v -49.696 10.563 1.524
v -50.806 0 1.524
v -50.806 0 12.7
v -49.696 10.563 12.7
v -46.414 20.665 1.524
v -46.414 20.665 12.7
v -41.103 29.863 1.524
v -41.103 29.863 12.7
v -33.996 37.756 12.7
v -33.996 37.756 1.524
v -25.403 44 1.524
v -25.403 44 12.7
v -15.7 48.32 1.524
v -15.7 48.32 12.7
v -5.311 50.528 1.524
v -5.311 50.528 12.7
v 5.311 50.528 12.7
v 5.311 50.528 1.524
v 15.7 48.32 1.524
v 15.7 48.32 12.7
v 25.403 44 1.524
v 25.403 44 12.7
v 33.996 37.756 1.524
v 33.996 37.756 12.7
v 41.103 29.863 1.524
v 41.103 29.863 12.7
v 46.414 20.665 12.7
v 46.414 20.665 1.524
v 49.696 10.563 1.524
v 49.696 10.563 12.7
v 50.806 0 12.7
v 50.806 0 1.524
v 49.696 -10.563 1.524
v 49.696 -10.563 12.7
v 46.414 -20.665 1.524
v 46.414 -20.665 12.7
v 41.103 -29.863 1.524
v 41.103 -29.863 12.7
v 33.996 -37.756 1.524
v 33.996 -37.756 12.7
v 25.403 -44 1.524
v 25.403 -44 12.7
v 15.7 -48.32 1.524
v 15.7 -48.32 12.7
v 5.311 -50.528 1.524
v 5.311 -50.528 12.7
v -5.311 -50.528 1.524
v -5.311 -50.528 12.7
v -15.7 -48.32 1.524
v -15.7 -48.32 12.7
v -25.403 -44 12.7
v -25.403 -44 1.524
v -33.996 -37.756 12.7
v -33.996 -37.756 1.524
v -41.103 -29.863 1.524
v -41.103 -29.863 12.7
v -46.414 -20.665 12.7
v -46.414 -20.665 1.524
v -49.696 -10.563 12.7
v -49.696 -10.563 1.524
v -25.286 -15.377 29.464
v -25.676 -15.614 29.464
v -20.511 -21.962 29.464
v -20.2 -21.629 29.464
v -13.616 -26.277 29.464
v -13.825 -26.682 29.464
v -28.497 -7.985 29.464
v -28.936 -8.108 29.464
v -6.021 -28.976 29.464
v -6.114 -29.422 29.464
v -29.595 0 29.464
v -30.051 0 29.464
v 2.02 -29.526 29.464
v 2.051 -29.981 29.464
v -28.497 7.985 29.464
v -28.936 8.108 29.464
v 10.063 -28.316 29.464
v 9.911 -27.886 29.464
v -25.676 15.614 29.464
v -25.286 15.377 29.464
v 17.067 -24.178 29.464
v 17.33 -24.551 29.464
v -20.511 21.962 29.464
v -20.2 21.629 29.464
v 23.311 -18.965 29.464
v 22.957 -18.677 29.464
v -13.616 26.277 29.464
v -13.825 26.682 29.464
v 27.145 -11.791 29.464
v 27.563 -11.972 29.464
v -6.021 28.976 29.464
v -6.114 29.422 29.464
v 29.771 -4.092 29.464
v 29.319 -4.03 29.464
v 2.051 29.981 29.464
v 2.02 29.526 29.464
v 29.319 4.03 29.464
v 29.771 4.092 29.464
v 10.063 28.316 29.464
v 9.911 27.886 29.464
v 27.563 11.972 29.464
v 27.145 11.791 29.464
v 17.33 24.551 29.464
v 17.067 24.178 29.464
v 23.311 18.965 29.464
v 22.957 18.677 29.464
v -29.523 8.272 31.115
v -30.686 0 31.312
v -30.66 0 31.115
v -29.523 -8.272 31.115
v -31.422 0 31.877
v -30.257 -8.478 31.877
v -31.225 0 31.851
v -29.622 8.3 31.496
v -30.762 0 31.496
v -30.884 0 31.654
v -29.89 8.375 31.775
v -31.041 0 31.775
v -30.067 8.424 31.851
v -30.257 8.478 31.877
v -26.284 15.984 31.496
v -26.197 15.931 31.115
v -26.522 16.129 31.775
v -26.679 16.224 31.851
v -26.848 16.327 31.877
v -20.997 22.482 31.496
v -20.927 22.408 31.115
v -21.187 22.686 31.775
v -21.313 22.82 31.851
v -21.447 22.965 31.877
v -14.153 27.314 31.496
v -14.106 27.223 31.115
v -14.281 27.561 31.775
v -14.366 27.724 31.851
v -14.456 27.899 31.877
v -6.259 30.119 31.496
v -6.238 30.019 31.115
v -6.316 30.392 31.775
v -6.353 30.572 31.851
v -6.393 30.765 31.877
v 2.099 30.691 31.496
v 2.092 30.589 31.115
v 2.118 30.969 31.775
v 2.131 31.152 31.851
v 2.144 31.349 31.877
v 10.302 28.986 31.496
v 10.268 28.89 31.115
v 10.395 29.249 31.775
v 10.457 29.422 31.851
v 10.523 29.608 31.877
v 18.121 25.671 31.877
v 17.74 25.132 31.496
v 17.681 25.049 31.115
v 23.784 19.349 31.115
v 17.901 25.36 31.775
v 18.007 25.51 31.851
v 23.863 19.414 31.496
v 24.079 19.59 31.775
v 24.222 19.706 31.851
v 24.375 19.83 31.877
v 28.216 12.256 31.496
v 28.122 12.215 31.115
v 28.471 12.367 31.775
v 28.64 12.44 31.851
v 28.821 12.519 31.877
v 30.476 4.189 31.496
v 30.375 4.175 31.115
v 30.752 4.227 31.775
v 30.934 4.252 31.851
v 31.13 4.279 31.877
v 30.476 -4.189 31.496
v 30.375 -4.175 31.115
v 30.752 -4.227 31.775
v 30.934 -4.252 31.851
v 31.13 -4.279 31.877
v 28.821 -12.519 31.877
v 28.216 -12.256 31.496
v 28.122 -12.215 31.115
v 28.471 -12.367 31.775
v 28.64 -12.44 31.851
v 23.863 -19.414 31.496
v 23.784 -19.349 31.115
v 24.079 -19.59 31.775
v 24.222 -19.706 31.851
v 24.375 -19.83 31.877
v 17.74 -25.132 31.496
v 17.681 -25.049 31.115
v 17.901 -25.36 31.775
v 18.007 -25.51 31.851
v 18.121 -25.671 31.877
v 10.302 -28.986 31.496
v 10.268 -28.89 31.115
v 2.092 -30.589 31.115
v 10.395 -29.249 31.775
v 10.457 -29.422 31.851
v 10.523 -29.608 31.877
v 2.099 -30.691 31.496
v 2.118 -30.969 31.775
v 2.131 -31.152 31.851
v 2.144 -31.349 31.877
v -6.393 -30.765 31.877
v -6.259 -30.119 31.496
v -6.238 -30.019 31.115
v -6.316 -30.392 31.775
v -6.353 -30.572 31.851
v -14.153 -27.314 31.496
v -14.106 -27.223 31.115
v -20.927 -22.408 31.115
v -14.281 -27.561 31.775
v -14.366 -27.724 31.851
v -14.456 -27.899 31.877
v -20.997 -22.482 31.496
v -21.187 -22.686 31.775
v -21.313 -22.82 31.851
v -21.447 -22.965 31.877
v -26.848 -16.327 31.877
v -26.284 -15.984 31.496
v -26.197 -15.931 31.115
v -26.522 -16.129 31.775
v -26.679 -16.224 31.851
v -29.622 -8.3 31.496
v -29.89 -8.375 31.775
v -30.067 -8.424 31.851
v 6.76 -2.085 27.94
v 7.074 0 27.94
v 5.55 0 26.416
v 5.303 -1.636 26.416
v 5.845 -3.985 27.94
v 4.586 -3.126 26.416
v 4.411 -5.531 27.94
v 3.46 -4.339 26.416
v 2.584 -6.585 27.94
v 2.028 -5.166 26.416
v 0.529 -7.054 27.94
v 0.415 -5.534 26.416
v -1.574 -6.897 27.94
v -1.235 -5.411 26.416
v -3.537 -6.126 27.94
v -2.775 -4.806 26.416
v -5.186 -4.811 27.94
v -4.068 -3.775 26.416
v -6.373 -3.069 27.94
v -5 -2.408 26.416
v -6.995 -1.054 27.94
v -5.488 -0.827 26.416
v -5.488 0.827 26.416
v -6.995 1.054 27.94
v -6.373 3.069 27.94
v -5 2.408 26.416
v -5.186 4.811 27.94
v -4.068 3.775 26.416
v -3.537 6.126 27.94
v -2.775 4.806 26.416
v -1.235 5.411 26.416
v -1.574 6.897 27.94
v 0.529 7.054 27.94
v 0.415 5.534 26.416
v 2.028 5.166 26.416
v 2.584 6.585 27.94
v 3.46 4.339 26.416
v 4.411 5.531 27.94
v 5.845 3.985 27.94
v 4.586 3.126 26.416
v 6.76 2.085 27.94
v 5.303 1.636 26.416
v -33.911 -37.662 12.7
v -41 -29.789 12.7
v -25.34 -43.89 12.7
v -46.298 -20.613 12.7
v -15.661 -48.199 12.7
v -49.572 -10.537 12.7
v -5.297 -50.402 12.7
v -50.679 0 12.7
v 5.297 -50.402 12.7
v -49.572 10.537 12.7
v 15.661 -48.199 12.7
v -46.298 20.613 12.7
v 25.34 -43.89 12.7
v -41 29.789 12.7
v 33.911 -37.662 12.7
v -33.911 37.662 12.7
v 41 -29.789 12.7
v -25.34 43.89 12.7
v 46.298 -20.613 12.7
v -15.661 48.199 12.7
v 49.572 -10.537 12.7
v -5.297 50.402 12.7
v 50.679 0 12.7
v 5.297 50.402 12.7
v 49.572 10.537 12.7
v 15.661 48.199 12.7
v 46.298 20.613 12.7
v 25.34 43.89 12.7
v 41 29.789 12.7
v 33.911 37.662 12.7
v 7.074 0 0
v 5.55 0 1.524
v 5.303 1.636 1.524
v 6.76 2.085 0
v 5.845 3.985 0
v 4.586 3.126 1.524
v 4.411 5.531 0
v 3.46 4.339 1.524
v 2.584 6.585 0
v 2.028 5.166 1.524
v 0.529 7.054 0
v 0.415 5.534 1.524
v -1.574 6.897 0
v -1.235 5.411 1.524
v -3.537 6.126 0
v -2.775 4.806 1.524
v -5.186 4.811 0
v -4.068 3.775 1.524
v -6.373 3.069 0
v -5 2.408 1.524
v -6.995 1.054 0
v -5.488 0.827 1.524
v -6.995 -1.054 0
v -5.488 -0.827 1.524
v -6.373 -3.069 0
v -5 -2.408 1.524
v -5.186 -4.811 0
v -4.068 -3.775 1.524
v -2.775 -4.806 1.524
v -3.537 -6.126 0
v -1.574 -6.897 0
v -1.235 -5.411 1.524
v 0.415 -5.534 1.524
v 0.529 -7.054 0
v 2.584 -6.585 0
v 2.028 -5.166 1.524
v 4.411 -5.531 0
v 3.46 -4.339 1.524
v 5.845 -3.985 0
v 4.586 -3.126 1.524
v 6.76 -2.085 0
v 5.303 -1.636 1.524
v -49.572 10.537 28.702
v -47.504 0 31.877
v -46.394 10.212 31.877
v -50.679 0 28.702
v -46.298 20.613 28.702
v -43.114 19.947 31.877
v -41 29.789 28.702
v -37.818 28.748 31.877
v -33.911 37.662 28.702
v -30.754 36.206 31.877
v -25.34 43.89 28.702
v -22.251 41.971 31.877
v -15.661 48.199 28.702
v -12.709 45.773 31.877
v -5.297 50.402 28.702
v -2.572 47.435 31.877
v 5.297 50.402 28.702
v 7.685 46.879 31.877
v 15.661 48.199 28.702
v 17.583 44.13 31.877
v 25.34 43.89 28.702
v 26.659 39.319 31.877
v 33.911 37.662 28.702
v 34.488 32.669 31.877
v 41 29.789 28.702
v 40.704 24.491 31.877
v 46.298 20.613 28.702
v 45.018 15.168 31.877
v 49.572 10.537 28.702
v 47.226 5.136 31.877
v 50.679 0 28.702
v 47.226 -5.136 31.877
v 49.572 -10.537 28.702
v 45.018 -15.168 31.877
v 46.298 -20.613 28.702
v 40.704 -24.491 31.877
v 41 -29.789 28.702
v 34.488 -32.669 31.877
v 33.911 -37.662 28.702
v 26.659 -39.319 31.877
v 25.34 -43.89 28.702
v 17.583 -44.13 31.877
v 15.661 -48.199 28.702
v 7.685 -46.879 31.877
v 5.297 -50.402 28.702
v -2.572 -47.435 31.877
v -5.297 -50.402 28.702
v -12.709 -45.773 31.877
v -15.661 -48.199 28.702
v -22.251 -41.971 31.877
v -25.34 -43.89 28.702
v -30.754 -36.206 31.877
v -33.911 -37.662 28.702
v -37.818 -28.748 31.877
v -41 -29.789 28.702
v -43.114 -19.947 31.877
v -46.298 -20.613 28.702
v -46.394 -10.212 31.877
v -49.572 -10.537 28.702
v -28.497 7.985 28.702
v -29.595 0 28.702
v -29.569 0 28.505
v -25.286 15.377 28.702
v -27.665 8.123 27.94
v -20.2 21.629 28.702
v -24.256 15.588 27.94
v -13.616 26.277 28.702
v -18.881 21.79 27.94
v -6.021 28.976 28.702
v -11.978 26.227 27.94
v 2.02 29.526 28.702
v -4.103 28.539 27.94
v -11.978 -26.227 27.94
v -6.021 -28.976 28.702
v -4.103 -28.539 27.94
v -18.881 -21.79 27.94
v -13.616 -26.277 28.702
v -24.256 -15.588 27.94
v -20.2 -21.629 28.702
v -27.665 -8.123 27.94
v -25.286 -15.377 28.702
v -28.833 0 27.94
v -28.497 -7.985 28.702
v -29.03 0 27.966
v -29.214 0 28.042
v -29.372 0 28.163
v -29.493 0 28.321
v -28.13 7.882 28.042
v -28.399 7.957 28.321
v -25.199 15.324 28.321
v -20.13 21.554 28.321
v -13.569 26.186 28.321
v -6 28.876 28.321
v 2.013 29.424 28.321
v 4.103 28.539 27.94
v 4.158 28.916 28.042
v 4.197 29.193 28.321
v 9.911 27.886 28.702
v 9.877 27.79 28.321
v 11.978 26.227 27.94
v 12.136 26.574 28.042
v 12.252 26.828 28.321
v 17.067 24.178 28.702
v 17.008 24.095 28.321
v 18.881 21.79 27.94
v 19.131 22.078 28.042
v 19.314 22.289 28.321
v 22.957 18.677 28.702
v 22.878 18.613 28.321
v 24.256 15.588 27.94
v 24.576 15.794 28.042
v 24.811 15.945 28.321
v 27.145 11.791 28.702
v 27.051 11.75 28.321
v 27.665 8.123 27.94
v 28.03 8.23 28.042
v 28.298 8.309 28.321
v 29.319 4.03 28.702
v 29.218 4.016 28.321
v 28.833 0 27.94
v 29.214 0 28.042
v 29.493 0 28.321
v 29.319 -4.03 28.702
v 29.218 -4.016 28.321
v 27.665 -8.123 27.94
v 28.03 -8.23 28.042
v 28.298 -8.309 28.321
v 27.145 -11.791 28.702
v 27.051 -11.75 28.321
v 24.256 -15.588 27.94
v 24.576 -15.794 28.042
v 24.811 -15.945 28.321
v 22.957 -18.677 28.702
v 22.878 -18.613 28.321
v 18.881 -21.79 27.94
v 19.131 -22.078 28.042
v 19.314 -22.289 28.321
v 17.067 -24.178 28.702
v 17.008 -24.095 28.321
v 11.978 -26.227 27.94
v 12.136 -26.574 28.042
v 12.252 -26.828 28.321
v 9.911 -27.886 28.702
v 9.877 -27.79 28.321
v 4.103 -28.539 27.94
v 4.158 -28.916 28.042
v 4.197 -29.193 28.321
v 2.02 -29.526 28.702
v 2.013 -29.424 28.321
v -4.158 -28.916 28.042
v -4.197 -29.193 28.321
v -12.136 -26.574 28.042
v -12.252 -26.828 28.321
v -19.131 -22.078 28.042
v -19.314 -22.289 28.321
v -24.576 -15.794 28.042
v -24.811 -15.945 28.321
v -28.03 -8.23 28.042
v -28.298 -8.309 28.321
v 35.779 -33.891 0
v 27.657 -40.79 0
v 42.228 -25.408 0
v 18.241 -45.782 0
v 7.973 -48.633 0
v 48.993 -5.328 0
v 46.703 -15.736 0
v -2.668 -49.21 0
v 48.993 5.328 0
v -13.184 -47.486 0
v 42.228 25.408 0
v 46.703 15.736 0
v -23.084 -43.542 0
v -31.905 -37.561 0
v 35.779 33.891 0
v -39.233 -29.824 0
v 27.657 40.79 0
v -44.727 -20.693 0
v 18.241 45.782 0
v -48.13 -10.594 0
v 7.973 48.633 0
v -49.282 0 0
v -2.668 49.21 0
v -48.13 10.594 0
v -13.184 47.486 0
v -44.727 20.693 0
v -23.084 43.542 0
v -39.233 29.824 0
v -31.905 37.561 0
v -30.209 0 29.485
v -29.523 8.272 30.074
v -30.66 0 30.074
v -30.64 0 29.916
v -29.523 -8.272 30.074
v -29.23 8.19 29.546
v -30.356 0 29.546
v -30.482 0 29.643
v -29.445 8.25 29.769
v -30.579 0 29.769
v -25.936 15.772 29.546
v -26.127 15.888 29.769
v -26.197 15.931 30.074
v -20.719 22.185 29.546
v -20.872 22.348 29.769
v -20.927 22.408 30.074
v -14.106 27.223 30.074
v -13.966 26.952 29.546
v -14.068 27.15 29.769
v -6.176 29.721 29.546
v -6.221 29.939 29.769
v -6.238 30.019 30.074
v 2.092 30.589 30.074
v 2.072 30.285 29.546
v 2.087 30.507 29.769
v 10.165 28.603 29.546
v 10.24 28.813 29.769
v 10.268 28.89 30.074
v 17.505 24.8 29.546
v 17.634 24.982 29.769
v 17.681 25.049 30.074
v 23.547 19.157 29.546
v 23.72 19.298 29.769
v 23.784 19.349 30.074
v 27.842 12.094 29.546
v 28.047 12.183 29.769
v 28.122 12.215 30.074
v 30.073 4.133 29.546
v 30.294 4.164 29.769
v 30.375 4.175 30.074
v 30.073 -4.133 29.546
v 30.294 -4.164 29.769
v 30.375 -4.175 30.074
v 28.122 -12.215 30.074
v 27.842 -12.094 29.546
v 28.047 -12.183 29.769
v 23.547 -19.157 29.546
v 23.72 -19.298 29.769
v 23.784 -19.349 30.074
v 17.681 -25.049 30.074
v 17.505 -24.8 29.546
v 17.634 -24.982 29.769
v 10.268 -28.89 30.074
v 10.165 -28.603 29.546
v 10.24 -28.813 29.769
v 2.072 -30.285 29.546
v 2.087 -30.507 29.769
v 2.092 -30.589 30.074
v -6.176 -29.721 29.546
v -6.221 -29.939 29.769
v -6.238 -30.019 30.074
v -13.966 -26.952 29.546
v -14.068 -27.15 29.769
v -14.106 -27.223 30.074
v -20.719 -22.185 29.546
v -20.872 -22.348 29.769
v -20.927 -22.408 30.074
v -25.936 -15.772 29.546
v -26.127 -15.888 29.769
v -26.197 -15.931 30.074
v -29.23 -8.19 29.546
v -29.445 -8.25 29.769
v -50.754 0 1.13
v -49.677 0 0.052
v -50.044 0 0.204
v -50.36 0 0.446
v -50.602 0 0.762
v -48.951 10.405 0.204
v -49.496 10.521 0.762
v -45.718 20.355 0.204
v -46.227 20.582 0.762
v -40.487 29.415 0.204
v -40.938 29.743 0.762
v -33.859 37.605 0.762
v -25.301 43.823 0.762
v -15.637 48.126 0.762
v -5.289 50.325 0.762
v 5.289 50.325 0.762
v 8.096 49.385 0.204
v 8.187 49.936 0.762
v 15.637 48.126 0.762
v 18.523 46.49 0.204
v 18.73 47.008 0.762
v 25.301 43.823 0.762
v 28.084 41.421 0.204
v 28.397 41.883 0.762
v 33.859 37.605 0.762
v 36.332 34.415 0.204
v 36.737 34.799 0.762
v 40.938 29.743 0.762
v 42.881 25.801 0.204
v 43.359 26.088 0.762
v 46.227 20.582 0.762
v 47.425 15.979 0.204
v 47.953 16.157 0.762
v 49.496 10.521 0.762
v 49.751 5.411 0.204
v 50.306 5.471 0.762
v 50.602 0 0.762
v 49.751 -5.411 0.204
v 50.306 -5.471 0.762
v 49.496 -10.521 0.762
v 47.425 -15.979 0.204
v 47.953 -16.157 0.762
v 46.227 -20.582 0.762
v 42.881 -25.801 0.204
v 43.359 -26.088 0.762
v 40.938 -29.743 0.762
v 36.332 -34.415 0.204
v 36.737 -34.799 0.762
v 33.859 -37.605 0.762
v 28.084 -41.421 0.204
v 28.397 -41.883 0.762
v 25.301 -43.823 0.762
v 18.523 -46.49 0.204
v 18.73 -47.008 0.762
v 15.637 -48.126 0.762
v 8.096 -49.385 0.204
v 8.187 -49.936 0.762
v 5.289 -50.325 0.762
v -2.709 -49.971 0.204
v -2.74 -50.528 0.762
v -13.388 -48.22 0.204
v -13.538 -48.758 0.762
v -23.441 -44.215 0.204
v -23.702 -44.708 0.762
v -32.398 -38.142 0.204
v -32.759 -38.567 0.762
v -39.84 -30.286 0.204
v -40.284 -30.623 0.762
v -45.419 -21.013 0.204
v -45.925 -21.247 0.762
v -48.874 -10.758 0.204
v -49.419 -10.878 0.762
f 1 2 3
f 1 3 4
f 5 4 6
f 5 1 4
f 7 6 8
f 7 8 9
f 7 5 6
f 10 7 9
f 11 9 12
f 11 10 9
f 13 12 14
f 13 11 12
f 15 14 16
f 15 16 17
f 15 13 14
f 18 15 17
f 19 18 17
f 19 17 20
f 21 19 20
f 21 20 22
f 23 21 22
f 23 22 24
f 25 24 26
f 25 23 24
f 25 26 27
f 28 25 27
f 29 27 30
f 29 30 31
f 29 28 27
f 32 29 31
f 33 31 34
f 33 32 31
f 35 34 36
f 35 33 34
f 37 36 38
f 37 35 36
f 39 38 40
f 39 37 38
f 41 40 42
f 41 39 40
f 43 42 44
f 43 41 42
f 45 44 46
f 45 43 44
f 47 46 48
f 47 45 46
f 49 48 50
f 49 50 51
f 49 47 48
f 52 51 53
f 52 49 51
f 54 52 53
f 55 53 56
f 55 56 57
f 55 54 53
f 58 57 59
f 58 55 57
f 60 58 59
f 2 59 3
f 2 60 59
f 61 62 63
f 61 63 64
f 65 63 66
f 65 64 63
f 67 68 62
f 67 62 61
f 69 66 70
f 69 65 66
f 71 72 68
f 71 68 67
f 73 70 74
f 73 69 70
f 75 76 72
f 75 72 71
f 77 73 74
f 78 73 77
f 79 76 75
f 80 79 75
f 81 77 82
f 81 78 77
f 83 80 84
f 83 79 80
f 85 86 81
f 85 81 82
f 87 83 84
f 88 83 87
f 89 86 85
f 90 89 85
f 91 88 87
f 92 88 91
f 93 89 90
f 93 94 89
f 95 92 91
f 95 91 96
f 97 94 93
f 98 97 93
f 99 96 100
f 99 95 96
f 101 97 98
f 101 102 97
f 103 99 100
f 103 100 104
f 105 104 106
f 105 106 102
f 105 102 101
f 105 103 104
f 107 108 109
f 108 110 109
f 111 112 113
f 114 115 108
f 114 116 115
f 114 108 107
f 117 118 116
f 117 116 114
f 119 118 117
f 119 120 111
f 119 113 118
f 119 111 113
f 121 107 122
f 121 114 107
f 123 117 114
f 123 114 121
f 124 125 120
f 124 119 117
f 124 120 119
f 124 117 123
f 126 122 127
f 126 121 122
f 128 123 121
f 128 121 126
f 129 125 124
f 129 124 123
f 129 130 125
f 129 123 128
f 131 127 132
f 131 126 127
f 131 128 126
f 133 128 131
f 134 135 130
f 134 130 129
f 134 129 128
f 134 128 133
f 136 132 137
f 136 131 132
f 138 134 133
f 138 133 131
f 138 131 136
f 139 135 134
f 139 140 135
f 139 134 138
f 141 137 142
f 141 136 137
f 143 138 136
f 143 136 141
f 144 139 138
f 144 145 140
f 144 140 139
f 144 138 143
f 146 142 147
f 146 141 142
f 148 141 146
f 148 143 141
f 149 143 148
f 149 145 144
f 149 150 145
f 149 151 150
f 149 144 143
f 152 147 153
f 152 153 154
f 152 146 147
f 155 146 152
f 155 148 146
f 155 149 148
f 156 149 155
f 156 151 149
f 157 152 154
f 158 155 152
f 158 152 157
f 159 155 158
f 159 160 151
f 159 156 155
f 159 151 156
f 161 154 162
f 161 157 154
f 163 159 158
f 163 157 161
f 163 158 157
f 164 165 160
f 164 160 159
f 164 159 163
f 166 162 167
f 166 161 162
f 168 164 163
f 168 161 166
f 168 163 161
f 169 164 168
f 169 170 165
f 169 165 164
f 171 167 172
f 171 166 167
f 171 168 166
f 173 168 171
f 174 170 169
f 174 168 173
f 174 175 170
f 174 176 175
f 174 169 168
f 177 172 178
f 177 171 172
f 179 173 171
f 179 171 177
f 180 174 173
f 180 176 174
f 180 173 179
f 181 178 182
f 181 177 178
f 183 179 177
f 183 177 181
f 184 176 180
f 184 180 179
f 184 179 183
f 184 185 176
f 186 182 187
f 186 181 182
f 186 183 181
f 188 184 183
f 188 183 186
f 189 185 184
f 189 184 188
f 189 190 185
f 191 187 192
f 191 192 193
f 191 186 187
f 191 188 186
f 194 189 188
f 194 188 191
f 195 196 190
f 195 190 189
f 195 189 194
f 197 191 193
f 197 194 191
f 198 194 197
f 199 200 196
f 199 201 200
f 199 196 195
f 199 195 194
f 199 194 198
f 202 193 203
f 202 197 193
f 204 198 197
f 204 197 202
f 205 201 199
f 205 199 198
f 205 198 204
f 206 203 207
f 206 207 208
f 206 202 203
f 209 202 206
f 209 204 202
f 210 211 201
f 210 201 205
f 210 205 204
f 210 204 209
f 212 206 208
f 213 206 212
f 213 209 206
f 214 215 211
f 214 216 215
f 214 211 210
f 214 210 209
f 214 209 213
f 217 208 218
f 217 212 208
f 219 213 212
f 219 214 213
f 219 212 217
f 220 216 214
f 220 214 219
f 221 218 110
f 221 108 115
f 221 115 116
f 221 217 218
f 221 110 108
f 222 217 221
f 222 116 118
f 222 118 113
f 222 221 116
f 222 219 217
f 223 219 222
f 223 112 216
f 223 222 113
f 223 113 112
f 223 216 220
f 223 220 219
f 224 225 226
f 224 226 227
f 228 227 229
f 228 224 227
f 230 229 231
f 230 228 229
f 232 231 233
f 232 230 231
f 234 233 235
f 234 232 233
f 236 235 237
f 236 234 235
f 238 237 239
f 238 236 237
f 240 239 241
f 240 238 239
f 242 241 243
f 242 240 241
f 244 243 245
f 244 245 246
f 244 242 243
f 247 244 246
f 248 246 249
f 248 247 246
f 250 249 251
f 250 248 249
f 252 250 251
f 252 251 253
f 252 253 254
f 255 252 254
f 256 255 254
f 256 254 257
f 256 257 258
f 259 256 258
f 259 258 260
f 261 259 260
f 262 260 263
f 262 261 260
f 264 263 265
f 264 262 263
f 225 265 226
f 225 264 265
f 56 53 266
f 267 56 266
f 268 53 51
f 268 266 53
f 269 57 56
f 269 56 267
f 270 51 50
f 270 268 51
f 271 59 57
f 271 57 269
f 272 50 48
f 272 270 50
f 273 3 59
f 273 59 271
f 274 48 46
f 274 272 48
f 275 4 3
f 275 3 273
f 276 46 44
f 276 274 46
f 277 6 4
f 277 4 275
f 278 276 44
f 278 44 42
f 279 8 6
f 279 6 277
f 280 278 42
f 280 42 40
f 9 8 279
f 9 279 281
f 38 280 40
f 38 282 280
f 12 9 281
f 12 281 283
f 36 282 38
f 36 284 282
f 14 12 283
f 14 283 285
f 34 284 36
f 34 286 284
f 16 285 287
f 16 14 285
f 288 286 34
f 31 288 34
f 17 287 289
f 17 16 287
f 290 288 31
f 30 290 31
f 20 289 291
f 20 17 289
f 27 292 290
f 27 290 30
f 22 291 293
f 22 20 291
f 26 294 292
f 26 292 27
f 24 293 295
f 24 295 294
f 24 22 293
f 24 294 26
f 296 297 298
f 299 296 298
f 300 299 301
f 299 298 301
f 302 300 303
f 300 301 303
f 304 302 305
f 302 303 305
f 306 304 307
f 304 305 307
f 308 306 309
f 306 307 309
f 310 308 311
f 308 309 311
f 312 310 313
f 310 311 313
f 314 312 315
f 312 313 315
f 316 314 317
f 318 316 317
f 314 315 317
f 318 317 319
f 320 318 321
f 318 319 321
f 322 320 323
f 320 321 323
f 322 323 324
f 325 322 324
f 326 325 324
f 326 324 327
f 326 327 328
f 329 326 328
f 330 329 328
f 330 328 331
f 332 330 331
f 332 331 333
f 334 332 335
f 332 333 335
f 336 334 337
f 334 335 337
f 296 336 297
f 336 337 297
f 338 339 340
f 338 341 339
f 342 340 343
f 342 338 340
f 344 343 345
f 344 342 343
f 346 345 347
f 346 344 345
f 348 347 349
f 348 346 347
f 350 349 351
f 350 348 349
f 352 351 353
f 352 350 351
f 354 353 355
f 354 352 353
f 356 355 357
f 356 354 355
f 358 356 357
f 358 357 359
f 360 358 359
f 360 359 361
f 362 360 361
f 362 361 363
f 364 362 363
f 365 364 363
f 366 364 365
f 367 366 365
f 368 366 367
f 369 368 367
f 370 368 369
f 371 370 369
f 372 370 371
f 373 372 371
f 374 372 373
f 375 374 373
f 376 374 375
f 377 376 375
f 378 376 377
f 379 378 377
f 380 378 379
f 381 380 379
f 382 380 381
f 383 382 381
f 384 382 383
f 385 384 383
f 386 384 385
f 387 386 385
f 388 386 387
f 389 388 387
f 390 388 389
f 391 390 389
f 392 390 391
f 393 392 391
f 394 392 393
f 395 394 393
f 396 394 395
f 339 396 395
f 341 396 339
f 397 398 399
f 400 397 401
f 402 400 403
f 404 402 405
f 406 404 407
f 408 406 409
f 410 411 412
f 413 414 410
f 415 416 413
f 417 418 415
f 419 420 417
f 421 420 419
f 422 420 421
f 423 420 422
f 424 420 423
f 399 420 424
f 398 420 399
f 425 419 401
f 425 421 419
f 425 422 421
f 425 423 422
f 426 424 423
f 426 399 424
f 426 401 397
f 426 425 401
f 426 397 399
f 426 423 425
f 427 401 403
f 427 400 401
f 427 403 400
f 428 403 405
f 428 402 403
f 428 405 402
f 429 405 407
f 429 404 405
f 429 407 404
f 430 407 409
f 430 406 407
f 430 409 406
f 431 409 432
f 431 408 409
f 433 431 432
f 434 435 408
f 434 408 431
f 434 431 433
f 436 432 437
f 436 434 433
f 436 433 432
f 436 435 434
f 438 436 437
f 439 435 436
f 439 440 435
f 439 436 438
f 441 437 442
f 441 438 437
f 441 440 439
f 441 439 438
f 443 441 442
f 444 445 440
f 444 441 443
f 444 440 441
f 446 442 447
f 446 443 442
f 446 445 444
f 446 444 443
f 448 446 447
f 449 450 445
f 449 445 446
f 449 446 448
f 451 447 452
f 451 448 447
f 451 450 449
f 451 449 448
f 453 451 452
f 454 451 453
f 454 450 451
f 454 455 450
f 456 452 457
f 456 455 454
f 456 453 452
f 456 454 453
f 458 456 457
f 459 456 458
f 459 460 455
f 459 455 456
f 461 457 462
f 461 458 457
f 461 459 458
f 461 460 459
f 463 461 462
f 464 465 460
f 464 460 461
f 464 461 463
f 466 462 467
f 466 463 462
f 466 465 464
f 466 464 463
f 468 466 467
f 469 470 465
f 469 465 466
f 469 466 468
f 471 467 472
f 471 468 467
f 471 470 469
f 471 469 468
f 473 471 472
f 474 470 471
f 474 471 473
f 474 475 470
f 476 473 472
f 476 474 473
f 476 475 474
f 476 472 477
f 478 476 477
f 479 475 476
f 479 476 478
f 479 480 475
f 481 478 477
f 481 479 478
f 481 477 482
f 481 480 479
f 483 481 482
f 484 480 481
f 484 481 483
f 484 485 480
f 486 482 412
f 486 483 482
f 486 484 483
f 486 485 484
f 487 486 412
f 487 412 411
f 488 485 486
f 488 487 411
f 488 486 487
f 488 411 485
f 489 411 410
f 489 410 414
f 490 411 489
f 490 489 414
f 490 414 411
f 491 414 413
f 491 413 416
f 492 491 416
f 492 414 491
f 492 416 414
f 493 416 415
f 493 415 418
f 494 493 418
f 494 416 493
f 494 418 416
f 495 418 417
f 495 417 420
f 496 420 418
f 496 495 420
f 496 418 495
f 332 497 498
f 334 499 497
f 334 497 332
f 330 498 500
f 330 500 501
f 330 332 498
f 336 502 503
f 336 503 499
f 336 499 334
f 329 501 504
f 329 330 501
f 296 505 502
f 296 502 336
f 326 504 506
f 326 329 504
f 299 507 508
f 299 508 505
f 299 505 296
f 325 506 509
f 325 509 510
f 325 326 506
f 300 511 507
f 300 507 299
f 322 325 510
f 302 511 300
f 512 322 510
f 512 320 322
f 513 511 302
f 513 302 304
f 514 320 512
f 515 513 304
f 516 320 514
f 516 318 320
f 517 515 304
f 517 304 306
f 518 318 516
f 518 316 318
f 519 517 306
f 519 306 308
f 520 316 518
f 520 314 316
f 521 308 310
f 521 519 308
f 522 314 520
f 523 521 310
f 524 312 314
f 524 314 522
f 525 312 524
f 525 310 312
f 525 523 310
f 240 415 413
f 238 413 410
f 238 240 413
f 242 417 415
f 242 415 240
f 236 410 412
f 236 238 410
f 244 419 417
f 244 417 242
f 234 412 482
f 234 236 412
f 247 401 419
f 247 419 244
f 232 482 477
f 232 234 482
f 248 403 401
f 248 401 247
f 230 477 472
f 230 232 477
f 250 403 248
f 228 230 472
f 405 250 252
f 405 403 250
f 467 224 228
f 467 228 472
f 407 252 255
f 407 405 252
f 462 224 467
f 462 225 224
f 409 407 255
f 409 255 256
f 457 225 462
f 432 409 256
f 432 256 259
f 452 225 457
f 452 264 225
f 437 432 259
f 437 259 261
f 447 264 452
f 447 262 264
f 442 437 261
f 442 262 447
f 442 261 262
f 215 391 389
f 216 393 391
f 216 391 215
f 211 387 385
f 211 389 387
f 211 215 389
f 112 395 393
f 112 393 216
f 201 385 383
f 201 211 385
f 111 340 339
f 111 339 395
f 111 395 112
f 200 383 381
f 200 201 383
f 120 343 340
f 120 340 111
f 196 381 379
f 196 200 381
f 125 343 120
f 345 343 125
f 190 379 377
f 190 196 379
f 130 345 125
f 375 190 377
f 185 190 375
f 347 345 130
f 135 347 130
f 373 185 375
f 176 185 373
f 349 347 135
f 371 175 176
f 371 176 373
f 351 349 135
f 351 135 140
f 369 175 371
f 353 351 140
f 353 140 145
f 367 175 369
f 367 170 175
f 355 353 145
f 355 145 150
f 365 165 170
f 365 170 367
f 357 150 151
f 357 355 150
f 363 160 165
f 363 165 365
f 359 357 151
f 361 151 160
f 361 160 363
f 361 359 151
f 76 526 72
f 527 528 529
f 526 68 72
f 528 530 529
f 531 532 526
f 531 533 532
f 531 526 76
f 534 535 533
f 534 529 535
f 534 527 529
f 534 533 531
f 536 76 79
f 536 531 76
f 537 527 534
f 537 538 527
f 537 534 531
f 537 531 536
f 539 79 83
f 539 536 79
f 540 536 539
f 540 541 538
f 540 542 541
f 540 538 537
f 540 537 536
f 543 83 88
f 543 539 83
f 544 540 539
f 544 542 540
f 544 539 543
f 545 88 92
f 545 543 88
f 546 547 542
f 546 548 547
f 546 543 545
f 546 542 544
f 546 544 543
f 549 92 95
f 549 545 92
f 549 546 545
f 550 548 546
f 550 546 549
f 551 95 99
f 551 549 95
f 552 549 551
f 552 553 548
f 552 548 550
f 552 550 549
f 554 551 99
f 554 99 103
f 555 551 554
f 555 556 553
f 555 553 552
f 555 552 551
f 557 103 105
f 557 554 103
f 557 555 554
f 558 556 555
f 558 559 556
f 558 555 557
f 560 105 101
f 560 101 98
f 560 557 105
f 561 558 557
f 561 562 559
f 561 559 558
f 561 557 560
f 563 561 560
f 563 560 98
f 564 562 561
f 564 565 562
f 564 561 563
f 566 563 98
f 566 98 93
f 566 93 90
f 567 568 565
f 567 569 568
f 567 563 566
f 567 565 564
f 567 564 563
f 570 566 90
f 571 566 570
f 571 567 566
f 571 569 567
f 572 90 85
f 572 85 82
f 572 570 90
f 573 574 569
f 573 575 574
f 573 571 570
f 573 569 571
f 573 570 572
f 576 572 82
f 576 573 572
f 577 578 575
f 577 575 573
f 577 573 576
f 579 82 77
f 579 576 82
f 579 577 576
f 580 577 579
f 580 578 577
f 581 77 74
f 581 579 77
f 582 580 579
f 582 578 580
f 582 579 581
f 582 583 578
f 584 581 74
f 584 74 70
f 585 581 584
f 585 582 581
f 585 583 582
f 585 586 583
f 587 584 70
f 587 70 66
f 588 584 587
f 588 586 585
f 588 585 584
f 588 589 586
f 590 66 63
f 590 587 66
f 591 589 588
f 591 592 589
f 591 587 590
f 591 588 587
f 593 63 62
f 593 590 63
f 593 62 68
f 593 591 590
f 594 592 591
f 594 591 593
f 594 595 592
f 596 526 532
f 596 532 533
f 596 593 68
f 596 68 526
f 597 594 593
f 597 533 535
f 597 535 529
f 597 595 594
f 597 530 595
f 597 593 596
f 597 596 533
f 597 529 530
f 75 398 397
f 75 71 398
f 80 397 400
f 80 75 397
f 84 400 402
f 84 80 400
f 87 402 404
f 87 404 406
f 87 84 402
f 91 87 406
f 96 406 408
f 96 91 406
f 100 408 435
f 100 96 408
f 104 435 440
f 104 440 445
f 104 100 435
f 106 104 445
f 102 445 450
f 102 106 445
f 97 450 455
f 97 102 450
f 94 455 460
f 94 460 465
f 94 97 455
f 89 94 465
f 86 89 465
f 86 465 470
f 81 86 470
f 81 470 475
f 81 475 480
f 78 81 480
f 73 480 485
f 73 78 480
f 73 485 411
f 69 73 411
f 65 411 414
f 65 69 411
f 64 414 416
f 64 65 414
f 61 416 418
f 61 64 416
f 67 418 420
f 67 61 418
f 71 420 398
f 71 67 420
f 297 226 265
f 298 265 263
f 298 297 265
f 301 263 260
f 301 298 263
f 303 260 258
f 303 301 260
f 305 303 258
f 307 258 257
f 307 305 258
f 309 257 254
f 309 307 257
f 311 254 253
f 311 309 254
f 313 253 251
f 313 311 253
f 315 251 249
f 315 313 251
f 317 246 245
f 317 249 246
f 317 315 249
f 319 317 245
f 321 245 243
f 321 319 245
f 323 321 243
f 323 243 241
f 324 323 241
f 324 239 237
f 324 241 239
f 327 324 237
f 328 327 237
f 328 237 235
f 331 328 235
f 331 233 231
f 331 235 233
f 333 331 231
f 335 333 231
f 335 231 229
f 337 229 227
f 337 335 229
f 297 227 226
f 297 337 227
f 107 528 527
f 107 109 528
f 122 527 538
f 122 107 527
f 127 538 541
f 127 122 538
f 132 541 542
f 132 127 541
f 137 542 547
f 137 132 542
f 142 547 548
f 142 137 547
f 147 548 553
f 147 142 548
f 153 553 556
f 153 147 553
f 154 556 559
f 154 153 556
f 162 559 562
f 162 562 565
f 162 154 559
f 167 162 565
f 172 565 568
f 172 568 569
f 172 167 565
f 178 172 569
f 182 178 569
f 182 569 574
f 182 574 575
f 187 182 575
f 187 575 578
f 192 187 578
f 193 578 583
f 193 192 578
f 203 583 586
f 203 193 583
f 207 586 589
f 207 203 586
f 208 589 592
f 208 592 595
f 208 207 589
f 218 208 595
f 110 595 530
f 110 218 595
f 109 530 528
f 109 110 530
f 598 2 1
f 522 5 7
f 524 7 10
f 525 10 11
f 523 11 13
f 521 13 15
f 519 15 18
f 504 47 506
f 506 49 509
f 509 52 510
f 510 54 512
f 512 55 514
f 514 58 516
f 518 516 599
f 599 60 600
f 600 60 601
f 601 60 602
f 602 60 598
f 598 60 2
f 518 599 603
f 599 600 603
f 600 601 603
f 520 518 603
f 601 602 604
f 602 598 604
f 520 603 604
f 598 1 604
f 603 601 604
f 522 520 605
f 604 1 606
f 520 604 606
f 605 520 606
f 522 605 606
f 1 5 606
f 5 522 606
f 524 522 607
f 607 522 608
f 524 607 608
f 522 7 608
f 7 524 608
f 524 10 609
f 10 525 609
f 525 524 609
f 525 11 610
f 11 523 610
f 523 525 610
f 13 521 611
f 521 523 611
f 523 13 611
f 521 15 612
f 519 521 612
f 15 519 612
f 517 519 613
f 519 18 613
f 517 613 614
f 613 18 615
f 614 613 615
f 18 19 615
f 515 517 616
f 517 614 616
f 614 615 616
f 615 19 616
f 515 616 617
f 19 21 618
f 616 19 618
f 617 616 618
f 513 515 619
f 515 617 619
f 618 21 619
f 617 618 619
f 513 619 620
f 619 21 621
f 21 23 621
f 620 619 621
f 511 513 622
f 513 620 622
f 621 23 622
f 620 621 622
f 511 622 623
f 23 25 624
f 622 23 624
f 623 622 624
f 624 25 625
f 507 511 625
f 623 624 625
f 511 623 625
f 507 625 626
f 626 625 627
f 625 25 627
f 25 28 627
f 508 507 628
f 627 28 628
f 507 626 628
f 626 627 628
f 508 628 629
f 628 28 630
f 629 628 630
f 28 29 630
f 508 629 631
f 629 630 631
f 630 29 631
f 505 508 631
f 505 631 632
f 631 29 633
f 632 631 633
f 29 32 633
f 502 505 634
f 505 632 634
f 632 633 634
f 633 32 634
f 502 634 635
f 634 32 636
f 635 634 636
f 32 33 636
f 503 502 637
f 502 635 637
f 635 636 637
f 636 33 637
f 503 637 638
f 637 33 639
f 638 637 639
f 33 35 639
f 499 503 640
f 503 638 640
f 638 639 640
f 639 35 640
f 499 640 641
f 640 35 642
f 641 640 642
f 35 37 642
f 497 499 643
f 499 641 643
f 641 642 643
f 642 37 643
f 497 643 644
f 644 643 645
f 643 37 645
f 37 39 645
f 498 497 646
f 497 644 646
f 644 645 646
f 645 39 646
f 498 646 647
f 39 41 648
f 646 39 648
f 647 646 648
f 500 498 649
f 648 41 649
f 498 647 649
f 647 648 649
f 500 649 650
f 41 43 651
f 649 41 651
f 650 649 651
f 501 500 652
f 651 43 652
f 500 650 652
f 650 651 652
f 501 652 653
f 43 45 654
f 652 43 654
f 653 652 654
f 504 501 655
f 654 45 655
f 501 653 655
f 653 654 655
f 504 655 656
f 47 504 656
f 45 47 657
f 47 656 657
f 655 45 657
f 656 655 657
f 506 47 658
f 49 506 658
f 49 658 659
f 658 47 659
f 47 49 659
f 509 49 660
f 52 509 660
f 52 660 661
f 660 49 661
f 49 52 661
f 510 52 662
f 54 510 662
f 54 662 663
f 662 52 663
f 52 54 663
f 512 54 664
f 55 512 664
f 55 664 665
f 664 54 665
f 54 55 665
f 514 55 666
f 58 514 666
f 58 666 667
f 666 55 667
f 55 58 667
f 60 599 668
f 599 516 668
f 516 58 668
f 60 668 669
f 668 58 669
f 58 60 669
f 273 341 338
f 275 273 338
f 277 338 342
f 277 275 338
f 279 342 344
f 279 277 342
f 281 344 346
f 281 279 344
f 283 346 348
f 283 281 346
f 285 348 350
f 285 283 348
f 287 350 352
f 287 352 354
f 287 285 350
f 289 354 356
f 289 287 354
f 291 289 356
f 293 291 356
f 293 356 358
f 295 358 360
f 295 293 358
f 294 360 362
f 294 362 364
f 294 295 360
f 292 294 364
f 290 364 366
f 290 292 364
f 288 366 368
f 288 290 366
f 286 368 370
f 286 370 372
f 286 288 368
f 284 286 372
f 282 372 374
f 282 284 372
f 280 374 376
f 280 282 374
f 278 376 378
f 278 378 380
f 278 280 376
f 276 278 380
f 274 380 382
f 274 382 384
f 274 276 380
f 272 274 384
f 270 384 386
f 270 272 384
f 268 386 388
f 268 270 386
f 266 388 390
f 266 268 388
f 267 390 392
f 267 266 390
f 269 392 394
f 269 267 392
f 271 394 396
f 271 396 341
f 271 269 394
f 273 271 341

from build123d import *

# Parameters (mm, degrees)
F2_R     = 5.5499
F3_DEPTH = 31.878
F4_SIZE  = 1.524
F5_R     = 1.524


with BuildPart() as f1:
    # F0 (on Front) → F1 (revolve)
    with BuildSketch(Plane.XZ):
        with BuildLine():
            Line((-50.80635, 0), (0, 0))
            Line((0, 0), (0, 27.94))
            Line((0, 27.94), (-28.83281, 27.94))
            ThreePointArc((-28.83281, 27.94), (-29.371625, 28.163185), (-29.59481, 28.702))
            Line((-29.59481, 28.702), (-29.59481, 29.464))
            Line((-29.59481, 29.464), (-30.05074, 29.464))
            ThreePointArc((-30.05074, 29.464), (-30.481792, 29.642548), (-30.66034, 30.0736))
            Line((-30.66034, 30.0736), (-30.66034, 31.115))
            ThreePointArc((-30.66034, 31.115), (-30.883525, 31.653815), (-31.42234, 31.877))
            Line((-31.42234, 31.877), (-47.50435, 31.877))
            Line((-47.50435, 31.877), (-50.67935, 28.702))
            Line((-50.67935, 28.702), (-50.67935, 12.7))
            Line((-50.67935, 12.7), (-50.80635, 12.7))
            Line((-50.80635, 12.7), (-50.80635, 0))
        make_face()
    revolve(axis=Axis((0, 0, 13.97), (0, 0, -1)))

    # F2 (on Top) → F3 (cut, through all)
    with BuildSketch(Plane.XY):
        Circle(F2_R)
    extrude(amount=F3_DEPTH, mode=Mode.SUBTRACT)

    # F4
    f4_edges = [f1.edges().sort_by_distance(p)[0] for p in [
        (-5.5499, 0, 27.94),
        (-5.5499, 0, 0),
    ]]
    chamfer(f4_edges, length=F4_SIZE)

    # F5
    f5_edges = [f1.edges().sort_by_distance(p)[0] for p in [
        (50.80635, 0, 0),
    ]]
    fillet(f5_edges, radius=F5_R)


solid = f1.part
